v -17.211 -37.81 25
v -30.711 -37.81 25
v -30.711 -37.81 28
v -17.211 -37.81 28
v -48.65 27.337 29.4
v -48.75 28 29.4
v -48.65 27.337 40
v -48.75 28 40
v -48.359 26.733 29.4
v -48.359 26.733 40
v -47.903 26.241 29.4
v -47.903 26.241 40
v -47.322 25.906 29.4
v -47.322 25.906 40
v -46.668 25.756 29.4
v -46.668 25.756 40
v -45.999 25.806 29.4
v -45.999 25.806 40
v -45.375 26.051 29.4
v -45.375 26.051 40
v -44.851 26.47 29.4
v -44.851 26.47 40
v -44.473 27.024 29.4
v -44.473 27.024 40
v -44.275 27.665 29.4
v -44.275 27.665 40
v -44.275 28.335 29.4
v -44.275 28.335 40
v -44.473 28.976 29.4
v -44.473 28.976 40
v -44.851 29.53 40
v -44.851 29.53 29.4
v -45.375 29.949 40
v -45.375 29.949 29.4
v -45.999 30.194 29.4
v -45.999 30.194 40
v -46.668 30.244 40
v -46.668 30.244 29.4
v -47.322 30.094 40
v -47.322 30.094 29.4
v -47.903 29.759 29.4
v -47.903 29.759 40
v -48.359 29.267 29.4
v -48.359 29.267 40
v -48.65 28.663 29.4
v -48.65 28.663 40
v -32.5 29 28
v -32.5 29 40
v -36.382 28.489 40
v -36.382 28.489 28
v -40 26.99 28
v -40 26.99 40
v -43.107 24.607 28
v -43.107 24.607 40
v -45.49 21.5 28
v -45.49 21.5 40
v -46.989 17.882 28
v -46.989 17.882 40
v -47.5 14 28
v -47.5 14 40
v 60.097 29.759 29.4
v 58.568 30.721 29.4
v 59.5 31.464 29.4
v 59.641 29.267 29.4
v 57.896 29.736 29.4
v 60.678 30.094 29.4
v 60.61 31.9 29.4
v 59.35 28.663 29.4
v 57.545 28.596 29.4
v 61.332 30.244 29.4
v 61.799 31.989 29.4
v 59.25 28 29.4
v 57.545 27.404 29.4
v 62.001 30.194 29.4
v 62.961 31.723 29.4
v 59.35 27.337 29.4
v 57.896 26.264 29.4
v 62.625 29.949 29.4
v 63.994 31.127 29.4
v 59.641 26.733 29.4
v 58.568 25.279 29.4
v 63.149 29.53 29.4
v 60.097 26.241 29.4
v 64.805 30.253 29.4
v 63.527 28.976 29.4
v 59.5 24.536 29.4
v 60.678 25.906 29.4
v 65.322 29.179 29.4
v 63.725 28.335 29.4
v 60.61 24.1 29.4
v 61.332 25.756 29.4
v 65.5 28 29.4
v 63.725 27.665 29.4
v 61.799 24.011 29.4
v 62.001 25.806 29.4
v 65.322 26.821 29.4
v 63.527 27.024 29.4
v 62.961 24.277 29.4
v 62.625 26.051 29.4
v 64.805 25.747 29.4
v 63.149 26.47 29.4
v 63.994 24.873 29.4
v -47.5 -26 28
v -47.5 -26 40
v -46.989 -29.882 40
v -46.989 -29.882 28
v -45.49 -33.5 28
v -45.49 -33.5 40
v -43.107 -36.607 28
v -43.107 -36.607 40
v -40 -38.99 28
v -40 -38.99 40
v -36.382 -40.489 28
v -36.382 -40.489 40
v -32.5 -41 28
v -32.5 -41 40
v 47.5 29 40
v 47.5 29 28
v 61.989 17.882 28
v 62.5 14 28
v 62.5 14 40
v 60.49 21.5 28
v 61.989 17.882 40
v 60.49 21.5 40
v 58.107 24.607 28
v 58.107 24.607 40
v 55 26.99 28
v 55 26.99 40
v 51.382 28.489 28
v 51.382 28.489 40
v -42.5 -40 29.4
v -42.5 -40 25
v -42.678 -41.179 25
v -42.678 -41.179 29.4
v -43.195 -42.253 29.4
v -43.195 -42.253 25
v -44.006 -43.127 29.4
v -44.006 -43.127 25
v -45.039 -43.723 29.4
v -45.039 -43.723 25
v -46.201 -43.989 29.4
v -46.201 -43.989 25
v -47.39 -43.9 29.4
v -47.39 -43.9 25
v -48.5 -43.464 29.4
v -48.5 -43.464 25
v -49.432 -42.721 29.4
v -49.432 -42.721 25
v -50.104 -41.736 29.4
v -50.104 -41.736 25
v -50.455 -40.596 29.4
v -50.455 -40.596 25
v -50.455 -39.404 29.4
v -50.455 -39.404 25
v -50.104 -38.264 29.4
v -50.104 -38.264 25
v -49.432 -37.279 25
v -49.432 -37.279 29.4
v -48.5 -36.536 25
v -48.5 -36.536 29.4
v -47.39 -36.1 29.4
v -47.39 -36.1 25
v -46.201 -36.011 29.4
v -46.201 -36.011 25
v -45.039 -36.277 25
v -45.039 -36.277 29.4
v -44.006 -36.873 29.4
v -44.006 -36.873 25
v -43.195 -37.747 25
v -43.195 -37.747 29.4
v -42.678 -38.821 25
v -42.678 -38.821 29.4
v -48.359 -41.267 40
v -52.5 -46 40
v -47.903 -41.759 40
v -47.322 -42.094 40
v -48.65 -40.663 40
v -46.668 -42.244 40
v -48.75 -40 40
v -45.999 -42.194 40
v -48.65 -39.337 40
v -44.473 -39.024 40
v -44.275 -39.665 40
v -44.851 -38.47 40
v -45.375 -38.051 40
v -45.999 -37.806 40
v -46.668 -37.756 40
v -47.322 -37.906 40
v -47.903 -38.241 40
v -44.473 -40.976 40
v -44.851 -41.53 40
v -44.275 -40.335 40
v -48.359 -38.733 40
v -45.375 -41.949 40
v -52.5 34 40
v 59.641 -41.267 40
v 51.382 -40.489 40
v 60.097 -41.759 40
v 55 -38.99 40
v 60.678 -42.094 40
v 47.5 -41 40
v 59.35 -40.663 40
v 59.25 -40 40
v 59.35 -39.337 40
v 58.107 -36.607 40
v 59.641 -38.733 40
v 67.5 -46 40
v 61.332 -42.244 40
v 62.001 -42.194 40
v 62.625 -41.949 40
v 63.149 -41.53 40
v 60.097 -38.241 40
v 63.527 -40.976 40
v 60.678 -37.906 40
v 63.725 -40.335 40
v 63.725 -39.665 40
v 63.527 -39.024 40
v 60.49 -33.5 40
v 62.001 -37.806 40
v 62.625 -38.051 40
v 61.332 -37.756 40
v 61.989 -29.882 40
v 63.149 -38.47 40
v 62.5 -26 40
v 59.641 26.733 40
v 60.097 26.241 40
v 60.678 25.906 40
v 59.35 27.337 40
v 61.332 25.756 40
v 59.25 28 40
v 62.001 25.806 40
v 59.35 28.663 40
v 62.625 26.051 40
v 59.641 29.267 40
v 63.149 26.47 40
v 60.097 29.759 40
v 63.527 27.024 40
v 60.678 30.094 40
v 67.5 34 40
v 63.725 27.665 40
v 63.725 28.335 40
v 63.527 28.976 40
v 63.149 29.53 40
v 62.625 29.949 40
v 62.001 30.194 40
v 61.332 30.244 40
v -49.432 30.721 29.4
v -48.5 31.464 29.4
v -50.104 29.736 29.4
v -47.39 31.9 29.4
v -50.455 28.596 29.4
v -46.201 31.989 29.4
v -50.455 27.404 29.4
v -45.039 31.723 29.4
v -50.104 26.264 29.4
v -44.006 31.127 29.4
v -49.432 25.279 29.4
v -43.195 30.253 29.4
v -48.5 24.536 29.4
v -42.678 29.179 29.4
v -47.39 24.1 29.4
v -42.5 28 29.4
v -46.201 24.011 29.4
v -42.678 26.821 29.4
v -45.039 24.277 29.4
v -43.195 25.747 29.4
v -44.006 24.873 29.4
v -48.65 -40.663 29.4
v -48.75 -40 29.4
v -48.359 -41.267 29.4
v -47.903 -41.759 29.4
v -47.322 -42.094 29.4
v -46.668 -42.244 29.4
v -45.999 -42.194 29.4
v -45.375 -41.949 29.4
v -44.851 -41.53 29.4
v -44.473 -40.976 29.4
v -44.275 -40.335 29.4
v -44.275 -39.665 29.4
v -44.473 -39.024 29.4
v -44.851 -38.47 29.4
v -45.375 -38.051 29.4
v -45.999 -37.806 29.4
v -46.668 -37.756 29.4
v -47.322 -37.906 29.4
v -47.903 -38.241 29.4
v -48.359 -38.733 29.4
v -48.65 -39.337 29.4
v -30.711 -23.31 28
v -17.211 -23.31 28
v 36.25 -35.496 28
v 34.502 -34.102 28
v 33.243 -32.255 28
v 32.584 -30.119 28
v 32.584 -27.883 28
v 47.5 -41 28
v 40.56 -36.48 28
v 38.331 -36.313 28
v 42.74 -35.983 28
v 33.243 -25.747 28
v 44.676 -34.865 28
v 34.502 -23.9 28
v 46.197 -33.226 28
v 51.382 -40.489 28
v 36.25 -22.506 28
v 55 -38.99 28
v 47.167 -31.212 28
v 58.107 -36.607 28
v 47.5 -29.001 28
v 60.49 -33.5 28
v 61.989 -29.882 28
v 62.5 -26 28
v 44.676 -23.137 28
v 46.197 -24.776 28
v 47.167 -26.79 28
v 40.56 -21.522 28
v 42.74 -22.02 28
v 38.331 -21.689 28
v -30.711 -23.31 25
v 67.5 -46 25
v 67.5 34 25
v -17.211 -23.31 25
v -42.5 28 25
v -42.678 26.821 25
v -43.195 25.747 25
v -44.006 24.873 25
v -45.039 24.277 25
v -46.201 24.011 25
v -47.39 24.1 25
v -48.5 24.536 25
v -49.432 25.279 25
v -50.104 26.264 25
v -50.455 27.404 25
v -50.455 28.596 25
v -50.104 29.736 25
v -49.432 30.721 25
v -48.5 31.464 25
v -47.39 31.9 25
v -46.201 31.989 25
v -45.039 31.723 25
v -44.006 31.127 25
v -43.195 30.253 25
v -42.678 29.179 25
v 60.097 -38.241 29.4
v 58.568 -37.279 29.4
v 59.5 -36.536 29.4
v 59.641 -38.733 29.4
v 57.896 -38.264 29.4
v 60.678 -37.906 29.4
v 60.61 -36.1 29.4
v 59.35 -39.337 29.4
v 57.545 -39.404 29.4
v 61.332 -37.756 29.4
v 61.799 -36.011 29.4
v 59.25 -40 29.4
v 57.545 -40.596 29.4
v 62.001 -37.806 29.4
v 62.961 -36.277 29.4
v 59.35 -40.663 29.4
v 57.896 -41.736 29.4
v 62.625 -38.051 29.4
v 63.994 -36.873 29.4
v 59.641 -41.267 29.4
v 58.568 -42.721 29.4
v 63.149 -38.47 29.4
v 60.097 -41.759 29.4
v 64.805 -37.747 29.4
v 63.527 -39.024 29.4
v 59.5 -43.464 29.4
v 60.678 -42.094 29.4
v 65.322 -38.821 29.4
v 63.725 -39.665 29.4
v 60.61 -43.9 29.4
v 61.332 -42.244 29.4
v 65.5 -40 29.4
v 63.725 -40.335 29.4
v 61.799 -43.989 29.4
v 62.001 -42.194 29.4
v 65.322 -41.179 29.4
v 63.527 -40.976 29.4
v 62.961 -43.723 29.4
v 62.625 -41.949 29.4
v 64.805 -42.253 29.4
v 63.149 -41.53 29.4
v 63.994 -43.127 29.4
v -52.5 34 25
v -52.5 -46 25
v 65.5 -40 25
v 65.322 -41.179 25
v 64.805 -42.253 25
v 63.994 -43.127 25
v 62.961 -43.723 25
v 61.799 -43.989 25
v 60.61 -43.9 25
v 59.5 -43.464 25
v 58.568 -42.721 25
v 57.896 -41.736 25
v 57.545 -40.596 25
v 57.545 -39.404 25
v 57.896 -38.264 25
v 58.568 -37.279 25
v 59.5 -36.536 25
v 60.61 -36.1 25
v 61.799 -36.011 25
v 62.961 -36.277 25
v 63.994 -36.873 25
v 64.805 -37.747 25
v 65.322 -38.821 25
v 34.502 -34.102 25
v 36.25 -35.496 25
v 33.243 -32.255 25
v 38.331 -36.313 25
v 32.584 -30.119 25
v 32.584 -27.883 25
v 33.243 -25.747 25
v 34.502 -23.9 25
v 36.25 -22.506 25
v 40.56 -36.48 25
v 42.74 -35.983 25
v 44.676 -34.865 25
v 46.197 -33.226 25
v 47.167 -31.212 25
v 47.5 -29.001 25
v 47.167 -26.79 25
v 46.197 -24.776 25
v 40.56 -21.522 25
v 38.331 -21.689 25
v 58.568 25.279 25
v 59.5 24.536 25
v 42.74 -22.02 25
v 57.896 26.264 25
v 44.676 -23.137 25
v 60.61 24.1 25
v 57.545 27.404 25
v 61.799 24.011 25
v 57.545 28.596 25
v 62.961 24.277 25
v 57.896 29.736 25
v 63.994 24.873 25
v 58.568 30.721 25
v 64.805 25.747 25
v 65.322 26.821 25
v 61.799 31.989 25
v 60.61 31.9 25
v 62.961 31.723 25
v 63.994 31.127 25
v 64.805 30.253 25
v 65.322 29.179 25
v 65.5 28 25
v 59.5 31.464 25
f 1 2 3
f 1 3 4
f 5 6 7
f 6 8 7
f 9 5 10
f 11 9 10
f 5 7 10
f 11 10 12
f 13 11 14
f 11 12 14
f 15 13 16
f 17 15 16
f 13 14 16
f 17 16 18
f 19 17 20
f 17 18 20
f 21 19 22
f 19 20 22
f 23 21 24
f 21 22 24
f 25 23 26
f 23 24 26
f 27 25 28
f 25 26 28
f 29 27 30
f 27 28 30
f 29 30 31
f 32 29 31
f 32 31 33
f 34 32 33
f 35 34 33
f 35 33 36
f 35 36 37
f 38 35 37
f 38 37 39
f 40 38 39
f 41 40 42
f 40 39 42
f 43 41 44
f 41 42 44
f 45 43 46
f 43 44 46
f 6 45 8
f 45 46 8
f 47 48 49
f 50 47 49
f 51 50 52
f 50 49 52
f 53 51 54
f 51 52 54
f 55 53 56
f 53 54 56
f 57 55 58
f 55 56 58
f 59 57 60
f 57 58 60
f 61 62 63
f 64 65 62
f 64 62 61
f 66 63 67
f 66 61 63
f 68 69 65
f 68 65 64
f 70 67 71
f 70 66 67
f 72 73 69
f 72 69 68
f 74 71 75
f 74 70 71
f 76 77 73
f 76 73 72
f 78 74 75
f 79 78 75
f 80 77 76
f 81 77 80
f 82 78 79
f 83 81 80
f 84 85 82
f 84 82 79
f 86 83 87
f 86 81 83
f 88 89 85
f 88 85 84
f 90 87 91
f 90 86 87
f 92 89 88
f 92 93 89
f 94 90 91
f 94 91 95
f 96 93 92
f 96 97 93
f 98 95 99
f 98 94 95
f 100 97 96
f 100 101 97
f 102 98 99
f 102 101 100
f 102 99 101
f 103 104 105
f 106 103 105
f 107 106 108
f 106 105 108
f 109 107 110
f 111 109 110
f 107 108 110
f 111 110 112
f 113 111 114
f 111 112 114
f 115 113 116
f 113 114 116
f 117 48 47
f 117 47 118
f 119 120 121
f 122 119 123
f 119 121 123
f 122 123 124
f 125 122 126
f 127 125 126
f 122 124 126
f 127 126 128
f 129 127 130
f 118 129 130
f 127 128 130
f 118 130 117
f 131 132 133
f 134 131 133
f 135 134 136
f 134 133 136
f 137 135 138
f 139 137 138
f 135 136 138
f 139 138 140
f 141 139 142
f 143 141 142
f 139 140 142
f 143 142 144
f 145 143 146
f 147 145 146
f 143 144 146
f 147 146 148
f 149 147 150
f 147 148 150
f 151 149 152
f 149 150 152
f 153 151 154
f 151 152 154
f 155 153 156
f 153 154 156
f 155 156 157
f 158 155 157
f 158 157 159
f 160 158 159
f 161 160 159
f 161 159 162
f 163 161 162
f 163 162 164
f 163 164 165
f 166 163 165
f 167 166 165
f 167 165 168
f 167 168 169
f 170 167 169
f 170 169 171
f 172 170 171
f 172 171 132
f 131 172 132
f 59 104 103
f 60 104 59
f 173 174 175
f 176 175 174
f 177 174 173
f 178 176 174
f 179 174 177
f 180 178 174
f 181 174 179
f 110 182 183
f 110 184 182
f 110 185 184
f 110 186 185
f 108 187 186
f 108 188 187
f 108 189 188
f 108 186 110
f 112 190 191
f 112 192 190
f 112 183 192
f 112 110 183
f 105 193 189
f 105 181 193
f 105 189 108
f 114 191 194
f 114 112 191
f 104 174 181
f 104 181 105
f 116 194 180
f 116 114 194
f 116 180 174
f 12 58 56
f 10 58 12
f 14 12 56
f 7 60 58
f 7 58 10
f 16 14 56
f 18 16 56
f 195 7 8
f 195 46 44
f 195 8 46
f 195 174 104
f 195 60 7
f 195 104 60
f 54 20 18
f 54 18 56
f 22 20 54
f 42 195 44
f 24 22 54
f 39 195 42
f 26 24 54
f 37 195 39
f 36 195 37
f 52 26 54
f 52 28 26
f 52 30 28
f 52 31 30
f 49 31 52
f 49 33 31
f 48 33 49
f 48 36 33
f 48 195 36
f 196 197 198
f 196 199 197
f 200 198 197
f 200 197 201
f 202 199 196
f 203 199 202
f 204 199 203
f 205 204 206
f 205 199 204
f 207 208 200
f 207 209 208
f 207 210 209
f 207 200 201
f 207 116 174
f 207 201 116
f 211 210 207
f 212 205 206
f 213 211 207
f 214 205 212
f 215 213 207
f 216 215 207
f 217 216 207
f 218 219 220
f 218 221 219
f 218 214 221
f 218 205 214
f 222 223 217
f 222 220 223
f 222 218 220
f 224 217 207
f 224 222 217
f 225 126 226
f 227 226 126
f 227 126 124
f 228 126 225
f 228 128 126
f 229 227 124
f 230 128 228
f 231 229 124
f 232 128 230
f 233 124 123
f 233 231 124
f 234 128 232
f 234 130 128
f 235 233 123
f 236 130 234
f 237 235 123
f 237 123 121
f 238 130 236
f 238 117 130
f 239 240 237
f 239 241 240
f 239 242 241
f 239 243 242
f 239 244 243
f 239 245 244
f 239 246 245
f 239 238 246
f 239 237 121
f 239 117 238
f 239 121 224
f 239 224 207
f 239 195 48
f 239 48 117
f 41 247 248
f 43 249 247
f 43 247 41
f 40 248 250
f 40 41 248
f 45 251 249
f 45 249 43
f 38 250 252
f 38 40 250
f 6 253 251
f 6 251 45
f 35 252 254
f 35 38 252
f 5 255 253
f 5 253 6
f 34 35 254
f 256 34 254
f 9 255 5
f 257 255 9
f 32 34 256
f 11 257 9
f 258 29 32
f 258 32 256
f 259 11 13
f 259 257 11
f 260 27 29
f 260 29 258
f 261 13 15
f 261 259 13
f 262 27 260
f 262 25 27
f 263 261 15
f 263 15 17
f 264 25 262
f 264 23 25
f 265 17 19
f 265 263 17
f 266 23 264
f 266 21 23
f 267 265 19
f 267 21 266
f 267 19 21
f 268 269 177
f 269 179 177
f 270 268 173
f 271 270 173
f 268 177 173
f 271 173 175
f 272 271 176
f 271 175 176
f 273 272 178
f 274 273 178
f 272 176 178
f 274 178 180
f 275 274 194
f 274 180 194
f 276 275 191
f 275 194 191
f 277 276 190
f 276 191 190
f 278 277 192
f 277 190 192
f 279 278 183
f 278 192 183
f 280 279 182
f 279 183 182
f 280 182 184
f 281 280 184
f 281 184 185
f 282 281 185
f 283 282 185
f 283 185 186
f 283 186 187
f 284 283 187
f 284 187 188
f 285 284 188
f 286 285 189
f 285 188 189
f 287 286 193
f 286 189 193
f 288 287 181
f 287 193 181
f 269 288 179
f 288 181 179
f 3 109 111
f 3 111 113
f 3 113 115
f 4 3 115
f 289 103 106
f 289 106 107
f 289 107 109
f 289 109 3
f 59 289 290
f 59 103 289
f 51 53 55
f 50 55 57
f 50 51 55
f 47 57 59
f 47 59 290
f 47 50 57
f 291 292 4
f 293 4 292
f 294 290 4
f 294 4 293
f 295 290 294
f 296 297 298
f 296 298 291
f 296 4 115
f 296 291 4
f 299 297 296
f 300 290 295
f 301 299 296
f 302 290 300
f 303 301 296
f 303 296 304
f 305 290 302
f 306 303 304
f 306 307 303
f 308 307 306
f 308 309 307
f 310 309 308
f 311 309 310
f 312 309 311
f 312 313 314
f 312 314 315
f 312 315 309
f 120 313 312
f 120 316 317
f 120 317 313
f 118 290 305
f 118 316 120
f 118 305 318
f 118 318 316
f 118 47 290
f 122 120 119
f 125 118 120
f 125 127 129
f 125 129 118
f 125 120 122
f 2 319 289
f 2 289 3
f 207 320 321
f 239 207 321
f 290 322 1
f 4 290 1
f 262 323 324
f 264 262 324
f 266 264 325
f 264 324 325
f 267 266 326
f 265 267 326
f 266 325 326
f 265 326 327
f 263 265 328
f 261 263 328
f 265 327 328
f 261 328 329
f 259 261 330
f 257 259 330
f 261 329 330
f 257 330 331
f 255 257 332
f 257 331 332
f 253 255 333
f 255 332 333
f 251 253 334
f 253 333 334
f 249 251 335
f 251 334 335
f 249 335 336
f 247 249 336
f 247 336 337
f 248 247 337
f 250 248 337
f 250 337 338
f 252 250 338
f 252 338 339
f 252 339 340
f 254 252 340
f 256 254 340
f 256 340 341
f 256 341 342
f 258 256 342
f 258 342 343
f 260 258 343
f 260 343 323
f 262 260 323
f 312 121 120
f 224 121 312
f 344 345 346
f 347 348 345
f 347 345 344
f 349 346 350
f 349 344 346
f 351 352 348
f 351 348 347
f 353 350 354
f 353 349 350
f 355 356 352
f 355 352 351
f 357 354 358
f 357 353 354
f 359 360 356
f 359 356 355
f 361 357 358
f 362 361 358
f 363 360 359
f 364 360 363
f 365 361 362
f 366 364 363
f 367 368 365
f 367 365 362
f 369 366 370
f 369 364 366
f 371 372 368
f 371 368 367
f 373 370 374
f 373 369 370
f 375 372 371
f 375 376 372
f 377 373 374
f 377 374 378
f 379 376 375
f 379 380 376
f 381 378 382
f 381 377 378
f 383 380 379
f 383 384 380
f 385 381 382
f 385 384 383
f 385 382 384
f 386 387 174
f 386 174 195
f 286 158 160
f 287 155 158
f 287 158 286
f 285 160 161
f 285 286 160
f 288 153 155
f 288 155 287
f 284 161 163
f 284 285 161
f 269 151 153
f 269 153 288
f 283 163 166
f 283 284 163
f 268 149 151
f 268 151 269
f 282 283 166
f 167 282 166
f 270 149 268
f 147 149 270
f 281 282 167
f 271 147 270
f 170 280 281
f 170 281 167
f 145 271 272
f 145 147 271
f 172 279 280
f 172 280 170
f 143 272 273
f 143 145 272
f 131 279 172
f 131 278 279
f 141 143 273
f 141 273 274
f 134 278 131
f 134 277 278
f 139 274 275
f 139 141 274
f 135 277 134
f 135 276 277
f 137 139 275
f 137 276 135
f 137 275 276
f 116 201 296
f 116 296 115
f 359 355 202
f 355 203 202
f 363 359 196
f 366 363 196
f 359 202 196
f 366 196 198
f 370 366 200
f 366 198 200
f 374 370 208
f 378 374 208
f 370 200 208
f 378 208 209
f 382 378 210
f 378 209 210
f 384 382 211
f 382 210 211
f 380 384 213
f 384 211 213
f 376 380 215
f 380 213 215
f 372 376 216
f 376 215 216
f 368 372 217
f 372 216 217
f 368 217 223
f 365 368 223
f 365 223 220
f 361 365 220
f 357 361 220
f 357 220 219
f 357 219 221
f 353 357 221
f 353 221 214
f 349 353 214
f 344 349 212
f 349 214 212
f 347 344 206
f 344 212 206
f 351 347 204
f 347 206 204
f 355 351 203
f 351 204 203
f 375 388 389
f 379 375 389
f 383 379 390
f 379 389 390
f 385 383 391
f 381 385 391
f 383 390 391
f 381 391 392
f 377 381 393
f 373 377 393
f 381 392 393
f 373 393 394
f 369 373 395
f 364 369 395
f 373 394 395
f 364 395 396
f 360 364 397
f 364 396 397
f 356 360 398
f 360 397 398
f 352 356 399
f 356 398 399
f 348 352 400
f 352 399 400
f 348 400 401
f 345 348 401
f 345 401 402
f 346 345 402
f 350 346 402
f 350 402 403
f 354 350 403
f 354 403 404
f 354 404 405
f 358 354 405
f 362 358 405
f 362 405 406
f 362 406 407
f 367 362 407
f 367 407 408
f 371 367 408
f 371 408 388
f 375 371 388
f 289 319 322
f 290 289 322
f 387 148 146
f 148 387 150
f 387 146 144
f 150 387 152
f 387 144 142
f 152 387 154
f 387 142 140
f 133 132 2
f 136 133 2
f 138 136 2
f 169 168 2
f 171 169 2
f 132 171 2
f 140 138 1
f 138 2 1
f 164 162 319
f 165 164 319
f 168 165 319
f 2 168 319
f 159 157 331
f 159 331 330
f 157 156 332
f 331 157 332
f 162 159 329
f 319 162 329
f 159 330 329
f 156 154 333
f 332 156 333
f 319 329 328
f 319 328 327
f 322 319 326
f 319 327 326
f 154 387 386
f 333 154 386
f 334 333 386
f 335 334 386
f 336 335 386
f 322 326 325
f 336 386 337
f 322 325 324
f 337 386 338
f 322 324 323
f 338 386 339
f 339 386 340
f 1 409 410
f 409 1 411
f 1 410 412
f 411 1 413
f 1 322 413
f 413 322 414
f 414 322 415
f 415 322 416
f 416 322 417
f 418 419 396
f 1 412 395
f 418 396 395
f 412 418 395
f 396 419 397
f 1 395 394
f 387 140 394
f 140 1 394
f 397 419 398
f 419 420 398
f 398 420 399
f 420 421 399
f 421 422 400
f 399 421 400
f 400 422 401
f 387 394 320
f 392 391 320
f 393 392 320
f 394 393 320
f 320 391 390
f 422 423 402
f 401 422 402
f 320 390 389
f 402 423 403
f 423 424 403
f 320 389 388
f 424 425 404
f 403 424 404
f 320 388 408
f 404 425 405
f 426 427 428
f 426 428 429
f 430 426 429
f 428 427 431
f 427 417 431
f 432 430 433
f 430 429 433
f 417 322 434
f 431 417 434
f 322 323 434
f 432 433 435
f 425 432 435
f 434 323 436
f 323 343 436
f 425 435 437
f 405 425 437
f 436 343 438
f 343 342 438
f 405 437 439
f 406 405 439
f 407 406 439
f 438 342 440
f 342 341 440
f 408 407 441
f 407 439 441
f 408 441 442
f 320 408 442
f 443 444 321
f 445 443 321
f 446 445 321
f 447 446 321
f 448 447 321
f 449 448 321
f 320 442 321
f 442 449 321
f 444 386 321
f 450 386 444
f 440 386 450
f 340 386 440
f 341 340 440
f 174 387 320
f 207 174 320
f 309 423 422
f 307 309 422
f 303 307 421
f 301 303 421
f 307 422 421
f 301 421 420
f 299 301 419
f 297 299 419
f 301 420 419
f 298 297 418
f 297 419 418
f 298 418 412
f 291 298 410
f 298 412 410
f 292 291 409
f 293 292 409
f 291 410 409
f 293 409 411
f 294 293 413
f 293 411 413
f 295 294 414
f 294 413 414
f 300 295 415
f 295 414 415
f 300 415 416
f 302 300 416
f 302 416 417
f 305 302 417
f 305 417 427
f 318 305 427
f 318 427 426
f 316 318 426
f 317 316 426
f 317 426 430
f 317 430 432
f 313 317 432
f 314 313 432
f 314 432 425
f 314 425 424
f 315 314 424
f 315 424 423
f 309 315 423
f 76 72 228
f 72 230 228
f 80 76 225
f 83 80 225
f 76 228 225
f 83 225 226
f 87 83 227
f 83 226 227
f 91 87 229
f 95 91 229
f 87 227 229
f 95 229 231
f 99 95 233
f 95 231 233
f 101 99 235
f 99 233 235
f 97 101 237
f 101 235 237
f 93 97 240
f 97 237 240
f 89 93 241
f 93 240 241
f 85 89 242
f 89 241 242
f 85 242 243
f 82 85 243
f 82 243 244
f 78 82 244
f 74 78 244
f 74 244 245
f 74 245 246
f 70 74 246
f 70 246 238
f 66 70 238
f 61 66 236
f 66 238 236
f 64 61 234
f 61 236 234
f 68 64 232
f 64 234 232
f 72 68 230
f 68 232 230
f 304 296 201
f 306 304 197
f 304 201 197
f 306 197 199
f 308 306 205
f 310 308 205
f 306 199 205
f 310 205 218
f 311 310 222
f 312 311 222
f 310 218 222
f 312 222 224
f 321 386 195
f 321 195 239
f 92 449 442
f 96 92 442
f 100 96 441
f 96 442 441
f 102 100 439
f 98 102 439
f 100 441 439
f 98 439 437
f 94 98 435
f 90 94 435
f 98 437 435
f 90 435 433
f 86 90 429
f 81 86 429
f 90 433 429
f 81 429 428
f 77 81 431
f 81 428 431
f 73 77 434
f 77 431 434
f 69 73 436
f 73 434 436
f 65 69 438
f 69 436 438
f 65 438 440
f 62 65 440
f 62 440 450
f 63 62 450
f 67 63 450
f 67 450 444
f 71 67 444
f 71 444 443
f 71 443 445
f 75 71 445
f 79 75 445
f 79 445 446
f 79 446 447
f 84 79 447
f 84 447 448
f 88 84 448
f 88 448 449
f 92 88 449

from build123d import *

# Parameters (mm, degrees)
BOX_W            = 120
BOX_H            = 80
BOX_DEPTH        = 15
POCKET_DEPTH     = 12
HOLE_D           = 4.5
HOLE_DEPTH       = 25
HOLE_CBORE_D     = 8
HOLE_CBORE_DEPTH = 4.4
SKETCH005_R      = 7.5
SKETCH005_W      = 13.5
SKETCH005_H      = 14.5
POCKET001_DEPTH  = 5


with BuildPart() as part:
    # Box → Box (join)
    with BuildSketch(Plane(origin=(-52.5, -46, 25), x_dir=(1, 0, 0), z_dir=(0, 0, 1))):
        with Locations((60, 40)):
            Rectangle(BOX_W, BOX_H)
    extrude(amount=BOX_DEPTH)

    # Sketch003 (on Face6 of Box) → Pocket (cut)
    with BuildSketch(Plane(origin=(-52.5, -46, 40), x_dir=(1, 0, 0), z_dir=(0, 0, 1))):
        with BuildLine():
            ThreePointArc((20, 75), (9.3933982822, 70.6066017178), (5, 60))
            Line((5, 20), (5, 60))
            ThreePointArc((5, 20), (9.3933982822, 9.3933982822), (20, 5))
            Line((100, 5), (20, 5))
            ThreePointArc((100, 5), (110.6066017178, 9.3933982822), (115, 20))
            Line((115, 60), (115, 20))
            ThreePointArc((115, 60), (110.6066017178, 70.6066017178), (100, 75))
            Line((20, 75), (100, 75))
        make_face()
    extrude(amount=-POCKET_DEPTH, mode=Mode.SUBTRACT)

    # Hole
    with Locations(Plane(origin=(-52.5, -46, 25), x_dir=(1, 0, 0), z_dir=(0, 0, -1))):
        with Locations((6, -6), (114, -6), (6, -74), (114, -74)):
            CounterBoreHole(HOLE_D / 2, HOLE_CBORE_D / 2, HOLE_CBORE_DEPTH, depth=HOLE_DEPTH)

    # Sketch005 (on Face5 of Hole) → Pocket001 (cut)
    with BuildSketch(Plane(origin=(-52.5, -46, 25), x_dir=(1, 0, 0), z_dir=(0, 0, -1))):
        with Locations((92.499962, -16.998899)):
            Circle(SKETCH005_R)
        with Locations((28.5389866751, -15.4398246124)):
            Rectangle(SKETCH005_W, SKETCH005_H)
    extrude(amount=-POCKET001_DEPTH, mode=Mode.SUBTRACT)


solid = part.part
